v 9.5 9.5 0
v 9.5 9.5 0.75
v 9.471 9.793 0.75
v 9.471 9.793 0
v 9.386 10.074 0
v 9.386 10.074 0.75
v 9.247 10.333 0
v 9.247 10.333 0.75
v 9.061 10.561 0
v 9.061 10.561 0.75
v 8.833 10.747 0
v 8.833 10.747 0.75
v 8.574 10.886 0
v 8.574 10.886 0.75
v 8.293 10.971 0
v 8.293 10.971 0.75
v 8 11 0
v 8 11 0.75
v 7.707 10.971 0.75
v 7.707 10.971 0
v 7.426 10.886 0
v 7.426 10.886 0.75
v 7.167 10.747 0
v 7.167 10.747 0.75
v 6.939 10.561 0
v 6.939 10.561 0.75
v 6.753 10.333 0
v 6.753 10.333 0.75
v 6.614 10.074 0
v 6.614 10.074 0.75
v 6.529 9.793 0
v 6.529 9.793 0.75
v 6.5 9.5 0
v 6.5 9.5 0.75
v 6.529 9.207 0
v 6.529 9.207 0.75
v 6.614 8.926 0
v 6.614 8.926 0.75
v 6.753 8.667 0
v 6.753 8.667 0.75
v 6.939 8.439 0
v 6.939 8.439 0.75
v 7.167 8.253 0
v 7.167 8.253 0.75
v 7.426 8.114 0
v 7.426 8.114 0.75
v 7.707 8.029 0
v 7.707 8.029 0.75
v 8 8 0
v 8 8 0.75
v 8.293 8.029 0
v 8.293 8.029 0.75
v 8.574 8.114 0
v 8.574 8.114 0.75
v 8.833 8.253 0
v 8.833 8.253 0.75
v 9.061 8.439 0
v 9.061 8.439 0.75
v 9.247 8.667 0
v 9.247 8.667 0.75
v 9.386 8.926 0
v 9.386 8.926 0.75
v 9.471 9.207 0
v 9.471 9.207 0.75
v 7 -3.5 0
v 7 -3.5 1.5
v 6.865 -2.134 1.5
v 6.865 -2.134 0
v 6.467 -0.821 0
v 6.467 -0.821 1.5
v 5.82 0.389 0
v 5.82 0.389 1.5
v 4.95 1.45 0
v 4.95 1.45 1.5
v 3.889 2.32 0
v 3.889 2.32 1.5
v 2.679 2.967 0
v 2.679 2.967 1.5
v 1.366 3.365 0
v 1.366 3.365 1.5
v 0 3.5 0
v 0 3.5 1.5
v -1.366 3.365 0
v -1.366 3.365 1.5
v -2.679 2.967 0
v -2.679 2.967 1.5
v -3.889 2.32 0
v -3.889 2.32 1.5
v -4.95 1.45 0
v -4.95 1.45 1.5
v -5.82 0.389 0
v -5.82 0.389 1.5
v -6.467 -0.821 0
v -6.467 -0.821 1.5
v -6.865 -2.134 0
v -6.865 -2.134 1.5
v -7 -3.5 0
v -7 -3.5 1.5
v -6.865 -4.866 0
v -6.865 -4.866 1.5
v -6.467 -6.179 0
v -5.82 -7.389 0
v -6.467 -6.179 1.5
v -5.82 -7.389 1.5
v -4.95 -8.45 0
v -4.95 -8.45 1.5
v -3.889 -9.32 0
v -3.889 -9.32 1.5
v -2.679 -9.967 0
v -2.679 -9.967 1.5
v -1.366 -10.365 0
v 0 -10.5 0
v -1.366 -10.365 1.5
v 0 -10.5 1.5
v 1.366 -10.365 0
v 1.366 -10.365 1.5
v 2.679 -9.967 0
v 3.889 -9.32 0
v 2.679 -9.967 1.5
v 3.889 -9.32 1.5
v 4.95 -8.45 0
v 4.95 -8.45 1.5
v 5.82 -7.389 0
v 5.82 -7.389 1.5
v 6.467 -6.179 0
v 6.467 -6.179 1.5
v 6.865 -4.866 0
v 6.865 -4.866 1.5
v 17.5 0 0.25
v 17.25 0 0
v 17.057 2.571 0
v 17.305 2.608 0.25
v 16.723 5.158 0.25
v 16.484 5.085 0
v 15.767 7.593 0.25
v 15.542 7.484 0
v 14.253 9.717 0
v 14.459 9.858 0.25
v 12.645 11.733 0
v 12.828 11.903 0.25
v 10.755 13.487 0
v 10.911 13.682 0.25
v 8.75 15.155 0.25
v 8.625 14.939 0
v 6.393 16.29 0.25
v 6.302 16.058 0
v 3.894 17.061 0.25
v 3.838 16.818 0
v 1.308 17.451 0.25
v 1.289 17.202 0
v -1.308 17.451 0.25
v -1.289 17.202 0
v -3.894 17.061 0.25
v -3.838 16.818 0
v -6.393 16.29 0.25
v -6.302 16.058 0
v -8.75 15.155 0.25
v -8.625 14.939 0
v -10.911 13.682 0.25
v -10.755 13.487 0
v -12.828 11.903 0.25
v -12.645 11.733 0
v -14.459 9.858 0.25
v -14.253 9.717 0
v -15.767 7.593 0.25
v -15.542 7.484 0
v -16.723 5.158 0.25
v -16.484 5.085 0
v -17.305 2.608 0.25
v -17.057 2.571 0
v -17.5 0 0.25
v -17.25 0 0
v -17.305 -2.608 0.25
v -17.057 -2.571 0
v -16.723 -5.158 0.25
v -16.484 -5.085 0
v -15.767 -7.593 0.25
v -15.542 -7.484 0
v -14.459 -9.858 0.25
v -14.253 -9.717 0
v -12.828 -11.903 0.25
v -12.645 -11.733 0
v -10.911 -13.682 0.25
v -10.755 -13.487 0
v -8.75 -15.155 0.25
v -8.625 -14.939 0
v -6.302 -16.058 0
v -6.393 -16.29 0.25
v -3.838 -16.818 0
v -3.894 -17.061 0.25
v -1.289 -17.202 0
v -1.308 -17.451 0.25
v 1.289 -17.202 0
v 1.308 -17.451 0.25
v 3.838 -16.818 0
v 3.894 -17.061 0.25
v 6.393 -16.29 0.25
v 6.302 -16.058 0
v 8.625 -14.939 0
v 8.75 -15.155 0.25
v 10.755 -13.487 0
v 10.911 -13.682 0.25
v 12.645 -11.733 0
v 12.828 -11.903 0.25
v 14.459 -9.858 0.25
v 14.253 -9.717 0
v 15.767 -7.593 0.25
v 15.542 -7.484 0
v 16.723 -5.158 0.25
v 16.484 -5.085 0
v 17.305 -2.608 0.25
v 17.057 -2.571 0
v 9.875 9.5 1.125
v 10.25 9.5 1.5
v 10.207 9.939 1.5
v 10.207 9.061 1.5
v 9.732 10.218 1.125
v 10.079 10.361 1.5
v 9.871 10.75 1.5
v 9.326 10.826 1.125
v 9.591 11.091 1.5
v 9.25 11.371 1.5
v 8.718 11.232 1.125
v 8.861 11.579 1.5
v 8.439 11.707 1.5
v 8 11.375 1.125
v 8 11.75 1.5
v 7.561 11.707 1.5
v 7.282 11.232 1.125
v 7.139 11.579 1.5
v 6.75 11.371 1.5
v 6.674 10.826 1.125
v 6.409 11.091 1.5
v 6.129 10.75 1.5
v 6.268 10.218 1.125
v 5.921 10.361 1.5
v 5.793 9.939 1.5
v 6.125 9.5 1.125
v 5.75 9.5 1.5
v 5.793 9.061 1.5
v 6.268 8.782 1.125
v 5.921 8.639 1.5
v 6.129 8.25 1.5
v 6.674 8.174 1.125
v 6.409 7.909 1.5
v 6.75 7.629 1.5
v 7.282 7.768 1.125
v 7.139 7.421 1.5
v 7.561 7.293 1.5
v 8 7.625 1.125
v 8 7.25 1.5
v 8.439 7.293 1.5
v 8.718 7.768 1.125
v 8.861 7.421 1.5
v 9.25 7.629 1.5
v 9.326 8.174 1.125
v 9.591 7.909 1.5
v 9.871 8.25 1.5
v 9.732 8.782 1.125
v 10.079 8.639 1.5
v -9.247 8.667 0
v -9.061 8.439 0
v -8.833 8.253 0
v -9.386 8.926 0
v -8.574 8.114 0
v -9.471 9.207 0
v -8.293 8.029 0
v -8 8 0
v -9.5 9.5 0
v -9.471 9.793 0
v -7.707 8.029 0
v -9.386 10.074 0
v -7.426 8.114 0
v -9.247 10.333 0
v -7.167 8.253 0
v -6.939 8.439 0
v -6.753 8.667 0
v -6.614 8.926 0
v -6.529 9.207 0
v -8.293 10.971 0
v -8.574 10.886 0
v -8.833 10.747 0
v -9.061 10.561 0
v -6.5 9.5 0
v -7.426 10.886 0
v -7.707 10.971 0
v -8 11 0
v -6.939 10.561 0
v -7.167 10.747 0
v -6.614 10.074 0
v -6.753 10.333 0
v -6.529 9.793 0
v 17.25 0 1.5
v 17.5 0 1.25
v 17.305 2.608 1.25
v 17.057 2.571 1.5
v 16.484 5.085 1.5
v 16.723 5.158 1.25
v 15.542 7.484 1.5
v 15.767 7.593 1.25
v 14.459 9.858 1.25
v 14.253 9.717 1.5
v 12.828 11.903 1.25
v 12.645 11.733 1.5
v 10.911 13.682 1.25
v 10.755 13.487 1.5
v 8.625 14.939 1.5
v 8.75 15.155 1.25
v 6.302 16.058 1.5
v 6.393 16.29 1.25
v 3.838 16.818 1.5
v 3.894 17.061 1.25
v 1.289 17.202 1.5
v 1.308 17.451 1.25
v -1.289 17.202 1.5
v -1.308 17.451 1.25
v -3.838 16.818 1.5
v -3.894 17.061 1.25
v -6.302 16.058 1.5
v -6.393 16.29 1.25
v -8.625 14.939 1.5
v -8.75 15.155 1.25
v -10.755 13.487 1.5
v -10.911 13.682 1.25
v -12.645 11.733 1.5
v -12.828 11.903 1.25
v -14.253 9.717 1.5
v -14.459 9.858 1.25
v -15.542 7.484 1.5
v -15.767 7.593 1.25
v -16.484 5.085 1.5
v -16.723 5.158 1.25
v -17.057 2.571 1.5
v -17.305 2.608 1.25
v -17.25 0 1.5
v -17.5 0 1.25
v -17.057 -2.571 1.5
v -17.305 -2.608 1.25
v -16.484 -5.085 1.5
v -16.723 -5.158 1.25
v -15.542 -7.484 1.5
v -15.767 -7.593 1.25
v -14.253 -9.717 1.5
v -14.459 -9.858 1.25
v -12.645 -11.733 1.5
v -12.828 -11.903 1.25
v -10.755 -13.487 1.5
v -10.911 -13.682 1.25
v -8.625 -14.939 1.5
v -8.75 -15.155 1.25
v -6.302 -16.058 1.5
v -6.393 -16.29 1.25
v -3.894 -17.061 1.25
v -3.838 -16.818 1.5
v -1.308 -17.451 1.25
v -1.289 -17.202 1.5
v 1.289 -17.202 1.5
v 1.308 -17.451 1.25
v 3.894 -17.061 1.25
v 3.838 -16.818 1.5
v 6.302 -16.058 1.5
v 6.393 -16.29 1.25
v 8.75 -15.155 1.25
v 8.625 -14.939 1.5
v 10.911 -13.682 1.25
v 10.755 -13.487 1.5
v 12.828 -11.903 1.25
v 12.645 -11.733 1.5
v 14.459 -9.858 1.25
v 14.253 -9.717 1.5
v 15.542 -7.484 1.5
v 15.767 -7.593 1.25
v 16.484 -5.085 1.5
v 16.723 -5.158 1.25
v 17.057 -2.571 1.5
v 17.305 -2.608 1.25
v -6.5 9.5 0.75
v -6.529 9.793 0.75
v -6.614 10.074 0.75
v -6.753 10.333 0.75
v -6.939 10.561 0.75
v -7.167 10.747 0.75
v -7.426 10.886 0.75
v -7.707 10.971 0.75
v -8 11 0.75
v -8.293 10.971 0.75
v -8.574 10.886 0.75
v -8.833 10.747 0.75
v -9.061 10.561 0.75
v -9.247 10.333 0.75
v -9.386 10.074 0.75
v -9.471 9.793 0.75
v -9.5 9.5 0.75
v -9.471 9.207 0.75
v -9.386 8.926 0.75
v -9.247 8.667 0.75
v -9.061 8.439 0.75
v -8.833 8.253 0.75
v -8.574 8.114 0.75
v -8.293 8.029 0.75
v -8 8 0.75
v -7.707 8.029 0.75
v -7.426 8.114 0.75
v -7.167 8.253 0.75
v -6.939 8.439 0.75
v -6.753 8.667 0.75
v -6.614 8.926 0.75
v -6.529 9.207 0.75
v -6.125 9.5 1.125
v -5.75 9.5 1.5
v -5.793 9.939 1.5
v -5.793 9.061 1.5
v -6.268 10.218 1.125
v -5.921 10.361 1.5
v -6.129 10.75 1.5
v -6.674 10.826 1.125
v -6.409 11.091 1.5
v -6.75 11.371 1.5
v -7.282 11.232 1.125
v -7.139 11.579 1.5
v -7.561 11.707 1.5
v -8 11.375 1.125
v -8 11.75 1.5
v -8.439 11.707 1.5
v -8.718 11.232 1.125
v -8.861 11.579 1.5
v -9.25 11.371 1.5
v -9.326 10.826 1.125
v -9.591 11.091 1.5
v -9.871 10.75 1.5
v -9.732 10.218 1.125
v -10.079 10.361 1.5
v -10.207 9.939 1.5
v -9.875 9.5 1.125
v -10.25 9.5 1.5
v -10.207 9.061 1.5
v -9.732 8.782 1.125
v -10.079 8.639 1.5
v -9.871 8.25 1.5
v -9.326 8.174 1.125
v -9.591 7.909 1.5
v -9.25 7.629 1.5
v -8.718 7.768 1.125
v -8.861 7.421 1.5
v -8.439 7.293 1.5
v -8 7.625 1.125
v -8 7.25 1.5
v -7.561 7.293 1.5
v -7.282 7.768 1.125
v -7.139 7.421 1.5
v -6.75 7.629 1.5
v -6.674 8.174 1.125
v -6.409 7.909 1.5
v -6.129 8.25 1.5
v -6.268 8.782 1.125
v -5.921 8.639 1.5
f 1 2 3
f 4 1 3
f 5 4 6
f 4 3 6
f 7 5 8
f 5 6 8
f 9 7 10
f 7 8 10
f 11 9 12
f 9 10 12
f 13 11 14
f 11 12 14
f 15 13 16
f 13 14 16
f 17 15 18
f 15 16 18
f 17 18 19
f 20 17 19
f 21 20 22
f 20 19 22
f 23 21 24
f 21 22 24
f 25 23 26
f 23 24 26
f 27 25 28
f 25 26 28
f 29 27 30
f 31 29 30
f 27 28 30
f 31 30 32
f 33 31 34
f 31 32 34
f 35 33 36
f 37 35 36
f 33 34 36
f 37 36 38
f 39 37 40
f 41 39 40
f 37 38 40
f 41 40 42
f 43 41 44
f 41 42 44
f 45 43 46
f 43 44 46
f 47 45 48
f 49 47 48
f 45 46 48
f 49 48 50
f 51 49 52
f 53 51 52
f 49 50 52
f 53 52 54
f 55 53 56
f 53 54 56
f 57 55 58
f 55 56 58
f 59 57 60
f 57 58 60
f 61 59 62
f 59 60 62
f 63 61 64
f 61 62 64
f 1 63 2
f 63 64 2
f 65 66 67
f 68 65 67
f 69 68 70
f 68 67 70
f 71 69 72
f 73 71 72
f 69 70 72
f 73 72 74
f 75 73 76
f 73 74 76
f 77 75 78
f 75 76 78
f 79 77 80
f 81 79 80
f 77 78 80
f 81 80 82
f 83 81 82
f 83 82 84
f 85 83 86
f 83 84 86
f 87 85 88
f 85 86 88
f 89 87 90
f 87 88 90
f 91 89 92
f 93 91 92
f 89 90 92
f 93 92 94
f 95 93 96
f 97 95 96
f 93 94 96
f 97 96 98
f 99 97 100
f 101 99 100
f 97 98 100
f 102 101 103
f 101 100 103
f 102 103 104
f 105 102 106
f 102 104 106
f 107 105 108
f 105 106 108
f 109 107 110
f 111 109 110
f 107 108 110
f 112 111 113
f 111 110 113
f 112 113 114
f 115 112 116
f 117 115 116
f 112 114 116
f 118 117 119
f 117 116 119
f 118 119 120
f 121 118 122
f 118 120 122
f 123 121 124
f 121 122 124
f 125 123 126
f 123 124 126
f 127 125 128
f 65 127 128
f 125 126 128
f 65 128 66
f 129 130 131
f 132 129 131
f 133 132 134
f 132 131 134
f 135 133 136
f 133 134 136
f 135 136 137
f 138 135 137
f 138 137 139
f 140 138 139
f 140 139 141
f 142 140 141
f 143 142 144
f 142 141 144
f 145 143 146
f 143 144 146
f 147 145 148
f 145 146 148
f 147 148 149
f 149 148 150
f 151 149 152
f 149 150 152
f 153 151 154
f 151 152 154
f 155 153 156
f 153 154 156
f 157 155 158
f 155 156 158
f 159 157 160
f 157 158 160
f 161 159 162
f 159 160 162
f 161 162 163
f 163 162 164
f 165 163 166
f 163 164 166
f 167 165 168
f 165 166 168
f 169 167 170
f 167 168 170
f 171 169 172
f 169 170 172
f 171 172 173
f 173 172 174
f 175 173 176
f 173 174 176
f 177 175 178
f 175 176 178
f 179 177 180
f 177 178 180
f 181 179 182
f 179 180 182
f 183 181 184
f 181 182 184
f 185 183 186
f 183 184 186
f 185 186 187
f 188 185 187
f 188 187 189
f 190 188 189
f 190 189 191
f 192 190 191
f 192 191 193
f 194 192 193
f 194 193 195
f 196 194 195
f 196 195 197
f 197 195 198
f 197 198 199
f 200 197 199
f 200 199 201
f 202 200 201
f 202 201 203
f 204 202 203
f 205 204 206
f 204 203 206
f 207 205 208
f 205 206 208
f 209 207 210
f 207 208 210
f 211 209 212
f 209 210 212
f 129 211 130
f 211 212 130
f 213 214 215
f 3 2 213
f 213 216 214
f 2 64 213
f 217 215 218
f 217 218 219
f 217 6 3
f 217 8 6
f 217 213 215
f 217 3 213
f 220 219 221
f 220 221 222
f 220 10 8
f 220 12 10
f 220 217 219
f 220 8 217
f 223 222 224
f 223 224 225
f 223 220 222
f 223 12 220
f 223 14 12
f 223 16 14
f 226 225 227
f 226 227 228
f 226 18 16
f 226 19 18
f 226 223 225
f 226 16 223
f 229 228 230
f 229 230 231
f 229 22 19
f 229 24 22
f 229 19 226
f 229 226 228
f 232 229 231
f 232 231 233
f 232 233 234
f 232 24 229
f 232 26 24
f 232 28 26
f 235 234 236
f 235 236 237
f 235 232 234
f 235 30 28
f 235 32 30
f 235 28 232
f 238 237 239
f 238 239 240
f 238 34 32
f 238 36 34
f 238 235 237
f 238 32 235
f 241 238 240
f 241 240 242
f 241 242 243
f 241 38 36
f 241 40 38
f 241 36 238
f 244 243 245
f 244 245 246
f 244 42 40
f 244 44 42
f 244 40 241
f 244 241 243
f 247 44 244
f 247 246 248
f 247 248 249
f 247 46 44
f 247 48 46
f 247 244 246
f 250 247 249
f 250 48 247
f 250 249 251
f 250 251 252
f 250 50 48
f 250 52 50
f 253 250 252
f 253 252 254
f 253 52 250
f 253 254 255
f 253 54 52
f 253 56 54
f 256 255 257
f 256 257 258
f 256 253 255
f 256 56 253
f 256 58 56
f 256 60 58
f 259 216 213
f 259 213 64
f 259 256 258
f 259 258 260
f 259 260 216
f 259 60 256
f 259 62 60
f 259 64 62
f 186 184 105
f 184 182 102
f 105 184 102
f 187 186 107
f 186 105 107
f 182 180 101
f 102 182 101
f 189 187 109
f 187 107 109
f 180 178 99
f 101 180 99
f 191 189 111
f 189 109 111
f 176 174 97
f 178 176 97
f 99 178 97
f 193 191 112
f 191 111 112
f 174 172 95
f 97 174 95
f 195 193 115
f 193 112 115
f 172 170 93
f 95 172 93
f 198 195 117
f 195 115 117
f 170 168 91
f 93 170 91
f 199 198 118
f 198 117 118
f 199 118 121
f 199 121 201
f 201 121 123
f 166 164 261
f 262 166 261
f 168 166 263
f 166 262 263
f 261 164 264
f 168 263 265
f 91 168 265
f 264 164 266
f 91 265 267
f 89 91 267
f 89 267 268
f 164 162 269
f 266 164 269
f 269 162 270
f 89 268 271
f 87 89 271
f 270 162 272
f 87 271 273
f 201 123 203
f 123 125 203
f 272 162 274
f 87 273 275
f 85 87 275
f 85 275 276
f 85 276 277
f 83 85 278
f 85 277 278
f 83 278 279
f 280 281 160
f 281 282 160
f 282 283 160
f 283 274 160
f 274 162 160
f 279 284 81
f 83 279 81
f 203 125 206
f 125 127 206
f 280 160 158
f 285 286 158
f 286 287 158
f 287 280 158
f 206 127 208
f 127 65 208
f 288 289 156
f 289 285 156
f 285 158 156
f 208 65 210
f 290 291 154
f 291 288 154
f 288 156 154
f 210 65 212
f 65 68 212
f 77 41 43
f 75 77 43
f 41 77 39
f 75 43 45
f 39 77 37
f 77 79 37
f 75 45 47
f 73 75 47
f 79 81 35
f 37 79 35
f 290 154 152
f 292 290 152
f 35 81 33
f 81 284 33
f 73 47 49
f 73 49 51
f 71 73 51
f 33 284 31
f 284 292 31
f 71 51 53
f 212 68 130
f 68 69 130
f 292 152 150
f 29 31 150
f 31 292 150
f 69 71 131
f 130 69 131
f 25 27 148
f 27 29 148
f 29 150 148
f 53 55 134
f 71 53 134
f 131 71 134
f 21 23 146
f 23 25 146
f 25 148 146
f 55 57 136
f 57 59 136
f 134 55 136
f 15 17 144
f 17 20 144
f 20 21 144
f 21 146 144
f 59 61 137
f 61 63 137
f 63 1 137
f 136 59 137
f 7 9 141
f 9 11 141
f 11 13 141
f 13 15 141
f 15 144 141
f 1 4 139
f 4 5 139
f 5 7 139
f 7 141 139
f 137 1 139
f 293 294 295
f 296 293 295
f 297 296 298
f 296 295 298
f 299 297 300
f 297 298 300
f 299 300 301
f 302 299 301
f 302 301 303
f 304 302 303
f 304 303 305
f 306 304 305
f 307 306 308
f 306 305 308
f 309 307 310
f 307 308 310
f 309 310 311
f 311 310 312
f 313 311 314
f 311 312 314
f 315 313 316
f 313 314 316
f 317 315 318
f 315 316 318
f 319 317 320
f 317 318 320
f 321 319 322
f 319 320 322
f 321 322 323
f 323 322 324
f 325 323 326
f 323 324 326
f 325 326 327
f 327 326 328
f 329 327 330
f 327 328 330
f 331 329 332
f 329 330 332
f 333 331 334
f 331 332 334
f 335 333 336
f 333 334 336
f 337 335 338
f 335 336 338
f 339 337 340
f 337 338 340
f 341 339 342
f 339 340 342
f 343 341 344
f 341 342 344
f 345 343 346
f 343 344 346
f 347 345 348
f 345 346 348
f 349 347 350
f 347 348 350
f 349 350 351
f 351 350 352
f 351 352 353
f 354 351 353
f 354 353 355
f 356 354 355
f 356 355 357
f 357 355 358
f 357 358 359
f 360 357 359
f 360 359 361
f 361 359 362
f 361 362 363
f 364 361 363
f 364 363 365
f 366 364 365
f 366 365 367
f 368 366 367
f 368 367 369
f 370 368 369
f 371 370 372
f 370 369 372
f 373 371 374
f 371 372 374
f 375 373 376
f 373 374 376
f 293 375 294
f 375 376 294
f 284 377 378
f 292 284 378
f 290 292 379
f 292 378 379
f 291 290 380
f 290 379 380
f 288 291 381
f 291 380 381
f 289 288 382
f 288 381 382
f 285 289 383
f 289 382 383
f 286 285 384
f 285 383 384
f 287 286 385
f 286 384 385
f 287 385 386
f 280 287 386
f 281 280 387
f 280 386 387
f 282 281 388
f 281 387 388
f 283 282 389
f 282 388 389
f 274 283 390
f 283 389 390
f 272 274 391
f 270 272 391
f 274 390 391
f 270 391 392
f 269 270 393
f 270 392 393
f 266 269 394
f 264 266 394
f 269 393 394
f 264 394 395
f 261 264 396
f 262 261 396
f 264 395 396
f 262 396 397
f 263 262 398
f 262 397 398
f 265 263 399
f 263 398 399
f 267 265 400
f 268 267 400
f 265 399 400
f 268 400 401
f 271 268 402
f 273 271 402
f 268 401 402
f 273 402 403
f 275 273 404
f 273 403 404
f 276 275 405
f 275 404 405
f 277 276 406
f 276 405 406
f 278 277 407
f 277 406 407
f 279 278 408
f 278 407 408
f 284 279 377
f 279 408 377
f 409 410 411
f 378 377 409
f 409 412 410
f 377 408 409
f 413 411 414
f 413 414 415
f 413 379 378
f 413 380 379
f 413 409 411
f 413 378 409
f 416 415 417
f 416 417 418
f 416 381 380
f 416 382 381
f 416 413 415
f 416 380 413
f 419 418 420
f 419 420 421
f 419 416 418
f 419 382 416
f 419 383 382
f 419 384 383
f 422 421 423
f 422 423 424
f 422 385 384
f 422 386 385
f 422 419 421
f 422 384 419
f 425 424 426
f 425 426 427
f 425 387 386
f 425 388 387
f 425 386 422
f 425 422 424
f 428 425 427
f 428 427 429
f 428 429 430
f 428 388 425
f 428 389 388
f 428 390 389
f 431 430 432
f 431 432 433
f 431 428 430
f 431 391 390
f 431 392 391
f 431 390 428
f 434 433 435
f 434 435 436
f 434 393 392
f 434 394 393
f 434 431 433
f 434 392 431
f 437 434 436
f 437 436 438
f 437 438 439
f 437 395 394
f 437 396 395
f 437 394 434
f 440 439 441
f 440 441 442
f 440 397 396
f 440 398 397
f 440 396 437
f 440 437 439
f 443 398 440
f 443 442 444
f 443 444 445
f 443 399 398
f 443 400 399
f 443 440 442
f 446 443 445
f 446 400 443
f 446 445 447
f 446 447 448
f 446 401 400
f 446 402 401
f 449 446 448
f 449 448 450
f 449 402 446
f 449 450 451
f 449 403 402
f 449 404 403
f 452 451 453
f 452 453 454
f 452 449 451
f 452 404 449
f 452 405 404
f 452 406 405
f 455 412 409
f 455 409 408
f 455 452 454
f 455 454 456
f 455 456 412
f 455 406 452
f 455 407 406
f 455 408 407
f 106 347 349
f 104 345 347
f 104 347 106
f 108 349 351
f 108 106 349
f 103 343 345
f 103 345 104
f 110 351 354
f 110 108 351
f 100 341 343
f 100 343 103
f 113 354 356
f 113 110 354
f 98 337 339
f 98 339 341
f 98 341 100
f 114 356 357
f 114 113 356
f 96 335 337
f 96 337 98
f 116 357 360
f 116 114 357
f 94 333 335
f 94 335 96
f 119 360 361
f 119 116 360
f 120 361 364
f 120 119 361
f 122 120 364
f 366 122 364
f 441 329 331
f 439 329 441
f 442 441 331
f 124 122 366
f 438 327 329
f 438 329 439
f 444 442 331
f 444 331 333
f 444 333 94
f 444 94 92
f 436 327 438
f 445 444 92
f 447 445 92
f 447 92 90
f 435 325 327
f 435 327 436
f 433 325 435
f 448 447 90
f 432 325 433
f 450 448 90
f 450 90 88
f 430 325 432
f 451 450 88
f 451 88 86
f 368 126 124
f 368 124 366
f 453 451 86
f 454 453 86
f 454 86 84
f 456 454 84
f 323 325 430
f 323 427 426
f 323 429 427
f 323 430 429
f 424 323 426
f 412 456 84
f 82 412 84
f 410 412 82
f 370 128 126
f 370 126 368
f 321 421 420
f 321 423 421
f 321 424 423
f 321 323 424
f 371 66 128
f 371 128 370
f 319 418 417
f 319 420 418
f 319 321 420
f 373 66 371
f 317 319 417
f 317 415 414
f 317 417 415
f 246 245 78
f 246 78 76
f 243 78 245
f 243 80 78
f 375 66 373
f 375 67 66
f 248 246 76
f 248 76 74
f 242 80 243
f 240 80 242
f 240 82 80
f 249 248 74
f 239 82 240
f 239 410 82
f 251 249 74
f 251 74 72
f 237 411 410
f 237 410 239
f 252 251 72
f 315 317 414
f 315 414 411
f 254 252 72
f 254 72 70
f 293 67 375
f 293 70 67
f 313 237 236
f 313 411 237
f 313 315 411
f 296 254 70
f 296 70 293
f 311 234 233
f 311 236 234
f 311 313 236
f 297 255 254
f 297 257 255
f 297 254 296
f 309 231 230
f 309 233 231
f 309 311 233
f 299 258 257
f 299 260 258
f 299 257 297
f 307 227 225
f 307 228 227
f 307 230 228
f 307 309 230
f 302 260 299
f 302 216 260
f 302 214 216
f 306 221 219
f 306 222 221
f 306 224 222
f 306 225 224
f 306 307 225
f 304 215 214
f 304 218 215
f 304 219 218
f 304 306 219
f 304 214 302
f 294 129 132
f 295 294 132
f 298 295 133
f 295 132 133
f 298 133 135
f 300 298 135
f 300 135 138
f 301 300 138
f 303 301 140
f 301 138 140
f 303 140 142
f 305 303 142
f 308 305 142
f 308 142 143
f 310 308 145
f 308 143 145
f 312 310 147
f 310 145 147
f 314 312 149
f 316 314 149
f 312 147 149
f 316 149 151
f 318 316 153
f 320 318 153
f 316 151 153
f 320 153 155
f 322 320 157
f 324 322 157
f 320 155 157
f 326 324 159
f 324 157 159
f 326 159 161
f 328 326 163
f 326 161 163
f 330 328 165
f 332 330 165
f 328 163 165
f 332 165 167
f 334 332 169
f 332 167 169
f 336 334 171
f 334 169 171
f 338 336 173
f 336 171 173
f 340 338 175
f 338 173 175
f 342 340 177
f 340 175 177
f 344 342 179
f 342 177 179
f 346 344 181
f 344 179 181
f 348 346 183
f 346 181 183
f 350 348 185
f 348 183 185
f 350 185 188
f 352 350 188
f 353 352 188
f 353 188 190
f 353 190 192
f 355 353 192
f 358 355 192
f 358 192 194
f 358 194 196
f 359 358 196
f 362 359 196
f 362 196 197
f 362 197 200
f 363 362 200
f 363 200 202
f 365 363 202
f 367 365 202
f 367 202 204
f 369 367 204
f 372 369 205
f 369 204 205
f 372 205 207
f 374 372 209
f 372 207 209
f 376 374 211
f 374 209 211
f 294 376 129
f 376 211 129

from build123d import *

# Parameters (mm, degrees)
SKETCH1_R           = 17.5
BOSS_EXTRUDE1_DEPTH = 1.5
SKETCH2_R           = 7
SKETCH2_R_2         = 1.5
CUT_EXTRUDE1_DEPTH  = 1.5
CHAMFER1_SIZE       = 0.75
CHAMFER2_SIZE       = 0.25


with BuildPart() as part:
    # Sketch1 → Boss-Extrude1 (new body)
    with BuildSketch(Plane.XY):
        Circle(SKETCH1_R)
    extrude(amount=BOSS_EXTRUDE1_DEPTH)

    # Sketch2 → Cut-Extrude1 (cut)
    with BuildSketch(Plane.XY.offset(1.5)):
        with Locations((0, -3.5)):
            Circle(SKETCH2_R)
        with Locations((-8, 9.5)):
            Circle(SKETCH2_R_2)
        with Locations((8, 9.5)):
            Circle(SKETCH2_R_2)
    extrude(amount=-CUT_EXTRUDE1_DEPTH, mode=Mode.SUBTRACT)

    # Chamfer1
    chamfer1_edges = [part.edges().sort_by_distance(p)[0] for p in [
        (-9.5, 9.5, 1.5),
        (6.5, 9.5, 1.5),
    ]]
    chamfer(chamfer1_edges, length=CHAMFER1_SIZE)

    # Chamfer2
    chamfer2_edges = [part.edges().sort_by_distance(p)[0] for p in [
        (-17.5, 0, 0),
        (-17.5, 0, 1.5),
    ]]
    chamfer(chamfer2_edges, length=CHAMFER2_SIZE)


solid = part.part
